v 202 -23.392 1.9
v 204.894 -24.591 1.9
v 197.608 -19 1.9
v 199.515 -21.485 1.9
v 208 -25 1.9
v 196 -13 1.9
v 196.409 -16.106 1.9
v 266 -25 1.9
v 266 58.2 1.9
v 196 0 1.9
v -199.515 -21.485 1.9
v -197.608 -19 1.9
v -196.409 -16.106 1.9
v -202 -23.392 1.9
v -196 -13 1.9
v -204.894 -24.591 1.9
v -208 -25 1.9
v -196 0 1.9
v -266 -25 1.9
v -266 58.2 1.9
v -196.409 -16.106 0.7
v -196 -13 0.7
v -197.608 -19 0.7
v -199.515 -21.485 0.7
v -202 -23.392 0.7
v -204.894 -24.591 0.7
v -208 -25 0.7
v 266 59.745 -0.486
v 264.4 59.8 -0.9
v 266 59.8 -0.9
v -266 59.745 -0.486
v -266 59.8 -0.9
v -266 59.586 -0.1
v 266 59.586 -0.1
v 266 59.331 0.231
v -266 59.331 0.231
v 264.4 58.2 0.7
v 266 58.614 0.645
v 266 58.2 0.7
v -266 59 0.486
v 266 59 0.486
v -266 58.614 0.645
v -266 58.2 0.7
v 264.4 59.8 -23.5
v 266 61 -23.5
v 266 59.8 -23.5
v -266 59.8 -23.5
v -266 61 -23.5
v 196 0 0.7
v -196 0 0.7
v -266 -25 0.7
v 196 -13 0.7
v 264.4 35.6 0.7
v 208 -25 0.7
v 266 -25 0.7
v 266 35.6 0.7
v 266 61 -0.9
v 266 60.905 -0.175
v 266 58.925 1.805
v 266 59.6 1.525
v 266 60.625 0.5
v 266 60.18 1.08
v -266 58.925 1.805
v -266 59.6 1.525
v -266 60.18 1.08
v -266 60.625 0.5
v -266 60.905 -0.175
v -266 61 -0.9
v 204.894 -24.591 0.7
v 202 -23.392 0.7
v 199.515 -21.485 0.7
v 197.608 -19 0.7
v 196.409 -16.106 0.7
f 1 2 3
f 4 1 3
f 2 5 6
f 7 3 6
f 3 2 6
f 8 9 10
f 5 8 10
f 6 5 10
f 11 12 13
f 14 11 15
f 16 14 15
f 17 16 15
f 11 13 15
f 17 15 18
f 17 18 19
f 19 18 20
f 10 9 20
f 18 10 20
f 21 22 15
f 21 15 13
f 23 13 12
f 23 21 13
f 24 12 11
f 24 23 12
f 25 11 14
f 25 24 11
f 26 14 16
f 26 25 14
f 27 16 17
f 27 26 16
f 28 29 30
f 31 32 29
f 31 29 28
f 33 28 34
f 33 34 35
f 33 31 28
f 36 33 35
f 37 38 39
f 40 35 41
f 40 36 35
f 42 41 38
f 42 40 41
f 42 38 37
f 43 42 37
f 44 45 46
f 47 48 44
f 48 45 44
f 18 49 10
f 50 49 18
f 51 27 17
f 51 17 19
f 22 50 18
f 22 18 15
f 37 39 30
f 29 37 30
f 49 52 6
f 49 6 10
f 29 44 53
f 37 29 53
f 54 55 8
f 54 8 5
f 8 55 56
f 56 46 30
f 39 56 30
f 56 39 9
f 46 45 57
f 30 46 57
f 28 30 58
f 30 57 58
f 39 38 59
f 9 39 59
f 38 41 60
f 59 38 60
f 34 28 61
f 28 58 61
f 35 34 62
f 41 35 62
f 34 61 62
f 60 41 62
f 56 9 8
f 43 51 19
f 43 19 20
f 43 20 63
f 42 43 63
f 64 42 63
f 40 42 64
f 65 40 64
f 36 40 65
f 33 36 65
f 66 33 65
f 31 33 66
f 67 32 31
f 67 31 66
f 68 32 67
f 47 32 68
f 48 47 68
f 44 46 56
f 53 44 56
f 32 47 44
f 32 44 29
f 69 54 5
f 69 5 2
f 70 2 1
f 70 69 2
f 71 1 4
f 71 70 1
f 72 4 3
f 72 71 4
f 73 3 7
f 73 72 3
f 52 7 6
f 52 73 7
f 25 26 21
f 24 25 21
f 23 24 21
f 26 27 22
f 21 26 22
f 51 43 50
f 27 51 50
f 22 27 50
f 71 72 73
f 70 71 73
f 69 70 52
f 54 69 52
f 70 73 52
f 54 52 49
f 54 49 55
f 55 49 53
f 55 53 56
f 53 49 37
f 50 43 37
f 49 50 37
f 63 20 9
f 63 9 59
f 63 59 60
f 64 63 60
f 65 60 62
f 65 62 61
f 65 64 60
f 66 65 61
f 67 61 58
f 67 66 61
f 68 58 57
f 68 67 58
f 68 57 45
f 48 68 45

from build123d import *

# Parameters (mm, degrees)
RESSALTO_EXTRUS_O1_DEPTH       = 1.9
CONVERTER_S_LIDO1_DEPTH        = 0.7
ARESTA_FLANGE1_STRIP_W         = 8
ARESTA_FLANGE1_STRIP_H         = 1.2
ARESTA_FLANGE1_STRIP_CUT_DEPTH = 532
ARESTA_FLANGE1_DEPTH           = 532
RESSALTO_EXTRUS_O2_DEPTH       = 1.6


# Read off the part's stored shape, not the designer's step: Converter-Sólido1
# Sheet-metal steps are written as plain solids
with BuildPart() as part:
    # Esboço1 → Ressalto-extrusão1 (new body)
    with BuildSketch(Plane.XY):
        with BuildLine():
            Line((-266, -25), (-266, 61))
            Line((-266, 61), (266, 61))
            Line((266, 61), (266, -25))
            Line((266, -25), (208, -25))
            ThreePointArc((208, -25), (199.514718626, -21.485281374), (196, -13))
            Line((196, -13), (196, 0))
            Line((196, 0), (-196, 0))
            Line((-196, 0), (-196, -13))
            ThreePointArc((-196, -13), (-199.514718626, -21.485281374), (-208, -25))
            Line((-208, -25), (-266, -25))
        make_face()
    extrude(amount=RESSALTO_EXTRUS_O1_DEPTH)

    # Converter-Sólido1 outline → Converter-Sólido1 (cut)
    with BuildSketch(Plane.XY):
        with BuildLine():
            Line((-266, -25), (-208, -25))
            ThreePointArc((-208, -25), (-199.514718626, -21.485281374), (-196, -13))
            Line((-196, -13), (-196, 0))
            Line((-196, 0), (196, 0))
            Line((196, 0), (196, -13))
            ThreePointArc((196, -13), (199.514718626, -21.485281374), (208, -25))
            Line((208, -25), (266, -25))
            Line((266, -25), (266, 61))
            Line((266, 61), (-266, 61))
            Line((-266, 61), (-266, -25))
        make_face()
    extrude(amount=CONVERTER_S_LIDO1_DEPTH, mode=Mode.SUBTRACT)

    # Aresta-Flange1 strip (across the edge) → Aresta-Flange1 strip cut (cut)
    with BuildSketch(Plane(origin=(-266, 61, 0.7), x_dir=(0, -1, 0), z_dir=(1, 0, 0))):
        with Locations((-1.2, -0.6)):
            Rectangle(ARESTA_FLANGE1_STRIP_W, ARESTA_FLANGE1_STRIP_H)
    extrude(amount=ARESTA_FLANGE1_STRIP_CUT_DEPTH, mode=Mode.SUBTRACT)

    # Aresta-Flange1 section (across the edge) → Aresta-Flange1 (add)
    with BuildSketch(Plane(origin=(-266, 61, 0.7), x_dir=(0, -1, 0), z_dir=(1, 0, 0))):
        with BuildLine():
            Line((0, 1.6), (0, 24.2))
            Line((0, 24.2), (1.2, 24.2))
            Line((1.2, 24.2), (1.2, 1.6))
            ThreePointArc((1.2, 1.6), (1.66862915, 0.46862915), (2.8, 0))
            Line((2.8, 0), (2.8, -1.2))
            ThreePointArc((2.8, -1.2), (0.820101013, -0.379898987), (0, 1.6))
        make_face()
    extrude(amount=ARESTA_FLANGE1_DEPTH)

    # Esboço5 → Ressalto-extrusão2 (add)
    with BuildSketch(Plane(origin=(266, 0, 0), x_dir=(0, 0, -1), z_dir=(1, 0, 0))):
        Polygon((23.5, 59.8), (-0.7, 35.6), (-0.7, 58.2), (0.9, 59.8), align=None)
    extrude(amount=-RESSALTO_EXTRUS_O2_DEPTH)


solid = part.part
